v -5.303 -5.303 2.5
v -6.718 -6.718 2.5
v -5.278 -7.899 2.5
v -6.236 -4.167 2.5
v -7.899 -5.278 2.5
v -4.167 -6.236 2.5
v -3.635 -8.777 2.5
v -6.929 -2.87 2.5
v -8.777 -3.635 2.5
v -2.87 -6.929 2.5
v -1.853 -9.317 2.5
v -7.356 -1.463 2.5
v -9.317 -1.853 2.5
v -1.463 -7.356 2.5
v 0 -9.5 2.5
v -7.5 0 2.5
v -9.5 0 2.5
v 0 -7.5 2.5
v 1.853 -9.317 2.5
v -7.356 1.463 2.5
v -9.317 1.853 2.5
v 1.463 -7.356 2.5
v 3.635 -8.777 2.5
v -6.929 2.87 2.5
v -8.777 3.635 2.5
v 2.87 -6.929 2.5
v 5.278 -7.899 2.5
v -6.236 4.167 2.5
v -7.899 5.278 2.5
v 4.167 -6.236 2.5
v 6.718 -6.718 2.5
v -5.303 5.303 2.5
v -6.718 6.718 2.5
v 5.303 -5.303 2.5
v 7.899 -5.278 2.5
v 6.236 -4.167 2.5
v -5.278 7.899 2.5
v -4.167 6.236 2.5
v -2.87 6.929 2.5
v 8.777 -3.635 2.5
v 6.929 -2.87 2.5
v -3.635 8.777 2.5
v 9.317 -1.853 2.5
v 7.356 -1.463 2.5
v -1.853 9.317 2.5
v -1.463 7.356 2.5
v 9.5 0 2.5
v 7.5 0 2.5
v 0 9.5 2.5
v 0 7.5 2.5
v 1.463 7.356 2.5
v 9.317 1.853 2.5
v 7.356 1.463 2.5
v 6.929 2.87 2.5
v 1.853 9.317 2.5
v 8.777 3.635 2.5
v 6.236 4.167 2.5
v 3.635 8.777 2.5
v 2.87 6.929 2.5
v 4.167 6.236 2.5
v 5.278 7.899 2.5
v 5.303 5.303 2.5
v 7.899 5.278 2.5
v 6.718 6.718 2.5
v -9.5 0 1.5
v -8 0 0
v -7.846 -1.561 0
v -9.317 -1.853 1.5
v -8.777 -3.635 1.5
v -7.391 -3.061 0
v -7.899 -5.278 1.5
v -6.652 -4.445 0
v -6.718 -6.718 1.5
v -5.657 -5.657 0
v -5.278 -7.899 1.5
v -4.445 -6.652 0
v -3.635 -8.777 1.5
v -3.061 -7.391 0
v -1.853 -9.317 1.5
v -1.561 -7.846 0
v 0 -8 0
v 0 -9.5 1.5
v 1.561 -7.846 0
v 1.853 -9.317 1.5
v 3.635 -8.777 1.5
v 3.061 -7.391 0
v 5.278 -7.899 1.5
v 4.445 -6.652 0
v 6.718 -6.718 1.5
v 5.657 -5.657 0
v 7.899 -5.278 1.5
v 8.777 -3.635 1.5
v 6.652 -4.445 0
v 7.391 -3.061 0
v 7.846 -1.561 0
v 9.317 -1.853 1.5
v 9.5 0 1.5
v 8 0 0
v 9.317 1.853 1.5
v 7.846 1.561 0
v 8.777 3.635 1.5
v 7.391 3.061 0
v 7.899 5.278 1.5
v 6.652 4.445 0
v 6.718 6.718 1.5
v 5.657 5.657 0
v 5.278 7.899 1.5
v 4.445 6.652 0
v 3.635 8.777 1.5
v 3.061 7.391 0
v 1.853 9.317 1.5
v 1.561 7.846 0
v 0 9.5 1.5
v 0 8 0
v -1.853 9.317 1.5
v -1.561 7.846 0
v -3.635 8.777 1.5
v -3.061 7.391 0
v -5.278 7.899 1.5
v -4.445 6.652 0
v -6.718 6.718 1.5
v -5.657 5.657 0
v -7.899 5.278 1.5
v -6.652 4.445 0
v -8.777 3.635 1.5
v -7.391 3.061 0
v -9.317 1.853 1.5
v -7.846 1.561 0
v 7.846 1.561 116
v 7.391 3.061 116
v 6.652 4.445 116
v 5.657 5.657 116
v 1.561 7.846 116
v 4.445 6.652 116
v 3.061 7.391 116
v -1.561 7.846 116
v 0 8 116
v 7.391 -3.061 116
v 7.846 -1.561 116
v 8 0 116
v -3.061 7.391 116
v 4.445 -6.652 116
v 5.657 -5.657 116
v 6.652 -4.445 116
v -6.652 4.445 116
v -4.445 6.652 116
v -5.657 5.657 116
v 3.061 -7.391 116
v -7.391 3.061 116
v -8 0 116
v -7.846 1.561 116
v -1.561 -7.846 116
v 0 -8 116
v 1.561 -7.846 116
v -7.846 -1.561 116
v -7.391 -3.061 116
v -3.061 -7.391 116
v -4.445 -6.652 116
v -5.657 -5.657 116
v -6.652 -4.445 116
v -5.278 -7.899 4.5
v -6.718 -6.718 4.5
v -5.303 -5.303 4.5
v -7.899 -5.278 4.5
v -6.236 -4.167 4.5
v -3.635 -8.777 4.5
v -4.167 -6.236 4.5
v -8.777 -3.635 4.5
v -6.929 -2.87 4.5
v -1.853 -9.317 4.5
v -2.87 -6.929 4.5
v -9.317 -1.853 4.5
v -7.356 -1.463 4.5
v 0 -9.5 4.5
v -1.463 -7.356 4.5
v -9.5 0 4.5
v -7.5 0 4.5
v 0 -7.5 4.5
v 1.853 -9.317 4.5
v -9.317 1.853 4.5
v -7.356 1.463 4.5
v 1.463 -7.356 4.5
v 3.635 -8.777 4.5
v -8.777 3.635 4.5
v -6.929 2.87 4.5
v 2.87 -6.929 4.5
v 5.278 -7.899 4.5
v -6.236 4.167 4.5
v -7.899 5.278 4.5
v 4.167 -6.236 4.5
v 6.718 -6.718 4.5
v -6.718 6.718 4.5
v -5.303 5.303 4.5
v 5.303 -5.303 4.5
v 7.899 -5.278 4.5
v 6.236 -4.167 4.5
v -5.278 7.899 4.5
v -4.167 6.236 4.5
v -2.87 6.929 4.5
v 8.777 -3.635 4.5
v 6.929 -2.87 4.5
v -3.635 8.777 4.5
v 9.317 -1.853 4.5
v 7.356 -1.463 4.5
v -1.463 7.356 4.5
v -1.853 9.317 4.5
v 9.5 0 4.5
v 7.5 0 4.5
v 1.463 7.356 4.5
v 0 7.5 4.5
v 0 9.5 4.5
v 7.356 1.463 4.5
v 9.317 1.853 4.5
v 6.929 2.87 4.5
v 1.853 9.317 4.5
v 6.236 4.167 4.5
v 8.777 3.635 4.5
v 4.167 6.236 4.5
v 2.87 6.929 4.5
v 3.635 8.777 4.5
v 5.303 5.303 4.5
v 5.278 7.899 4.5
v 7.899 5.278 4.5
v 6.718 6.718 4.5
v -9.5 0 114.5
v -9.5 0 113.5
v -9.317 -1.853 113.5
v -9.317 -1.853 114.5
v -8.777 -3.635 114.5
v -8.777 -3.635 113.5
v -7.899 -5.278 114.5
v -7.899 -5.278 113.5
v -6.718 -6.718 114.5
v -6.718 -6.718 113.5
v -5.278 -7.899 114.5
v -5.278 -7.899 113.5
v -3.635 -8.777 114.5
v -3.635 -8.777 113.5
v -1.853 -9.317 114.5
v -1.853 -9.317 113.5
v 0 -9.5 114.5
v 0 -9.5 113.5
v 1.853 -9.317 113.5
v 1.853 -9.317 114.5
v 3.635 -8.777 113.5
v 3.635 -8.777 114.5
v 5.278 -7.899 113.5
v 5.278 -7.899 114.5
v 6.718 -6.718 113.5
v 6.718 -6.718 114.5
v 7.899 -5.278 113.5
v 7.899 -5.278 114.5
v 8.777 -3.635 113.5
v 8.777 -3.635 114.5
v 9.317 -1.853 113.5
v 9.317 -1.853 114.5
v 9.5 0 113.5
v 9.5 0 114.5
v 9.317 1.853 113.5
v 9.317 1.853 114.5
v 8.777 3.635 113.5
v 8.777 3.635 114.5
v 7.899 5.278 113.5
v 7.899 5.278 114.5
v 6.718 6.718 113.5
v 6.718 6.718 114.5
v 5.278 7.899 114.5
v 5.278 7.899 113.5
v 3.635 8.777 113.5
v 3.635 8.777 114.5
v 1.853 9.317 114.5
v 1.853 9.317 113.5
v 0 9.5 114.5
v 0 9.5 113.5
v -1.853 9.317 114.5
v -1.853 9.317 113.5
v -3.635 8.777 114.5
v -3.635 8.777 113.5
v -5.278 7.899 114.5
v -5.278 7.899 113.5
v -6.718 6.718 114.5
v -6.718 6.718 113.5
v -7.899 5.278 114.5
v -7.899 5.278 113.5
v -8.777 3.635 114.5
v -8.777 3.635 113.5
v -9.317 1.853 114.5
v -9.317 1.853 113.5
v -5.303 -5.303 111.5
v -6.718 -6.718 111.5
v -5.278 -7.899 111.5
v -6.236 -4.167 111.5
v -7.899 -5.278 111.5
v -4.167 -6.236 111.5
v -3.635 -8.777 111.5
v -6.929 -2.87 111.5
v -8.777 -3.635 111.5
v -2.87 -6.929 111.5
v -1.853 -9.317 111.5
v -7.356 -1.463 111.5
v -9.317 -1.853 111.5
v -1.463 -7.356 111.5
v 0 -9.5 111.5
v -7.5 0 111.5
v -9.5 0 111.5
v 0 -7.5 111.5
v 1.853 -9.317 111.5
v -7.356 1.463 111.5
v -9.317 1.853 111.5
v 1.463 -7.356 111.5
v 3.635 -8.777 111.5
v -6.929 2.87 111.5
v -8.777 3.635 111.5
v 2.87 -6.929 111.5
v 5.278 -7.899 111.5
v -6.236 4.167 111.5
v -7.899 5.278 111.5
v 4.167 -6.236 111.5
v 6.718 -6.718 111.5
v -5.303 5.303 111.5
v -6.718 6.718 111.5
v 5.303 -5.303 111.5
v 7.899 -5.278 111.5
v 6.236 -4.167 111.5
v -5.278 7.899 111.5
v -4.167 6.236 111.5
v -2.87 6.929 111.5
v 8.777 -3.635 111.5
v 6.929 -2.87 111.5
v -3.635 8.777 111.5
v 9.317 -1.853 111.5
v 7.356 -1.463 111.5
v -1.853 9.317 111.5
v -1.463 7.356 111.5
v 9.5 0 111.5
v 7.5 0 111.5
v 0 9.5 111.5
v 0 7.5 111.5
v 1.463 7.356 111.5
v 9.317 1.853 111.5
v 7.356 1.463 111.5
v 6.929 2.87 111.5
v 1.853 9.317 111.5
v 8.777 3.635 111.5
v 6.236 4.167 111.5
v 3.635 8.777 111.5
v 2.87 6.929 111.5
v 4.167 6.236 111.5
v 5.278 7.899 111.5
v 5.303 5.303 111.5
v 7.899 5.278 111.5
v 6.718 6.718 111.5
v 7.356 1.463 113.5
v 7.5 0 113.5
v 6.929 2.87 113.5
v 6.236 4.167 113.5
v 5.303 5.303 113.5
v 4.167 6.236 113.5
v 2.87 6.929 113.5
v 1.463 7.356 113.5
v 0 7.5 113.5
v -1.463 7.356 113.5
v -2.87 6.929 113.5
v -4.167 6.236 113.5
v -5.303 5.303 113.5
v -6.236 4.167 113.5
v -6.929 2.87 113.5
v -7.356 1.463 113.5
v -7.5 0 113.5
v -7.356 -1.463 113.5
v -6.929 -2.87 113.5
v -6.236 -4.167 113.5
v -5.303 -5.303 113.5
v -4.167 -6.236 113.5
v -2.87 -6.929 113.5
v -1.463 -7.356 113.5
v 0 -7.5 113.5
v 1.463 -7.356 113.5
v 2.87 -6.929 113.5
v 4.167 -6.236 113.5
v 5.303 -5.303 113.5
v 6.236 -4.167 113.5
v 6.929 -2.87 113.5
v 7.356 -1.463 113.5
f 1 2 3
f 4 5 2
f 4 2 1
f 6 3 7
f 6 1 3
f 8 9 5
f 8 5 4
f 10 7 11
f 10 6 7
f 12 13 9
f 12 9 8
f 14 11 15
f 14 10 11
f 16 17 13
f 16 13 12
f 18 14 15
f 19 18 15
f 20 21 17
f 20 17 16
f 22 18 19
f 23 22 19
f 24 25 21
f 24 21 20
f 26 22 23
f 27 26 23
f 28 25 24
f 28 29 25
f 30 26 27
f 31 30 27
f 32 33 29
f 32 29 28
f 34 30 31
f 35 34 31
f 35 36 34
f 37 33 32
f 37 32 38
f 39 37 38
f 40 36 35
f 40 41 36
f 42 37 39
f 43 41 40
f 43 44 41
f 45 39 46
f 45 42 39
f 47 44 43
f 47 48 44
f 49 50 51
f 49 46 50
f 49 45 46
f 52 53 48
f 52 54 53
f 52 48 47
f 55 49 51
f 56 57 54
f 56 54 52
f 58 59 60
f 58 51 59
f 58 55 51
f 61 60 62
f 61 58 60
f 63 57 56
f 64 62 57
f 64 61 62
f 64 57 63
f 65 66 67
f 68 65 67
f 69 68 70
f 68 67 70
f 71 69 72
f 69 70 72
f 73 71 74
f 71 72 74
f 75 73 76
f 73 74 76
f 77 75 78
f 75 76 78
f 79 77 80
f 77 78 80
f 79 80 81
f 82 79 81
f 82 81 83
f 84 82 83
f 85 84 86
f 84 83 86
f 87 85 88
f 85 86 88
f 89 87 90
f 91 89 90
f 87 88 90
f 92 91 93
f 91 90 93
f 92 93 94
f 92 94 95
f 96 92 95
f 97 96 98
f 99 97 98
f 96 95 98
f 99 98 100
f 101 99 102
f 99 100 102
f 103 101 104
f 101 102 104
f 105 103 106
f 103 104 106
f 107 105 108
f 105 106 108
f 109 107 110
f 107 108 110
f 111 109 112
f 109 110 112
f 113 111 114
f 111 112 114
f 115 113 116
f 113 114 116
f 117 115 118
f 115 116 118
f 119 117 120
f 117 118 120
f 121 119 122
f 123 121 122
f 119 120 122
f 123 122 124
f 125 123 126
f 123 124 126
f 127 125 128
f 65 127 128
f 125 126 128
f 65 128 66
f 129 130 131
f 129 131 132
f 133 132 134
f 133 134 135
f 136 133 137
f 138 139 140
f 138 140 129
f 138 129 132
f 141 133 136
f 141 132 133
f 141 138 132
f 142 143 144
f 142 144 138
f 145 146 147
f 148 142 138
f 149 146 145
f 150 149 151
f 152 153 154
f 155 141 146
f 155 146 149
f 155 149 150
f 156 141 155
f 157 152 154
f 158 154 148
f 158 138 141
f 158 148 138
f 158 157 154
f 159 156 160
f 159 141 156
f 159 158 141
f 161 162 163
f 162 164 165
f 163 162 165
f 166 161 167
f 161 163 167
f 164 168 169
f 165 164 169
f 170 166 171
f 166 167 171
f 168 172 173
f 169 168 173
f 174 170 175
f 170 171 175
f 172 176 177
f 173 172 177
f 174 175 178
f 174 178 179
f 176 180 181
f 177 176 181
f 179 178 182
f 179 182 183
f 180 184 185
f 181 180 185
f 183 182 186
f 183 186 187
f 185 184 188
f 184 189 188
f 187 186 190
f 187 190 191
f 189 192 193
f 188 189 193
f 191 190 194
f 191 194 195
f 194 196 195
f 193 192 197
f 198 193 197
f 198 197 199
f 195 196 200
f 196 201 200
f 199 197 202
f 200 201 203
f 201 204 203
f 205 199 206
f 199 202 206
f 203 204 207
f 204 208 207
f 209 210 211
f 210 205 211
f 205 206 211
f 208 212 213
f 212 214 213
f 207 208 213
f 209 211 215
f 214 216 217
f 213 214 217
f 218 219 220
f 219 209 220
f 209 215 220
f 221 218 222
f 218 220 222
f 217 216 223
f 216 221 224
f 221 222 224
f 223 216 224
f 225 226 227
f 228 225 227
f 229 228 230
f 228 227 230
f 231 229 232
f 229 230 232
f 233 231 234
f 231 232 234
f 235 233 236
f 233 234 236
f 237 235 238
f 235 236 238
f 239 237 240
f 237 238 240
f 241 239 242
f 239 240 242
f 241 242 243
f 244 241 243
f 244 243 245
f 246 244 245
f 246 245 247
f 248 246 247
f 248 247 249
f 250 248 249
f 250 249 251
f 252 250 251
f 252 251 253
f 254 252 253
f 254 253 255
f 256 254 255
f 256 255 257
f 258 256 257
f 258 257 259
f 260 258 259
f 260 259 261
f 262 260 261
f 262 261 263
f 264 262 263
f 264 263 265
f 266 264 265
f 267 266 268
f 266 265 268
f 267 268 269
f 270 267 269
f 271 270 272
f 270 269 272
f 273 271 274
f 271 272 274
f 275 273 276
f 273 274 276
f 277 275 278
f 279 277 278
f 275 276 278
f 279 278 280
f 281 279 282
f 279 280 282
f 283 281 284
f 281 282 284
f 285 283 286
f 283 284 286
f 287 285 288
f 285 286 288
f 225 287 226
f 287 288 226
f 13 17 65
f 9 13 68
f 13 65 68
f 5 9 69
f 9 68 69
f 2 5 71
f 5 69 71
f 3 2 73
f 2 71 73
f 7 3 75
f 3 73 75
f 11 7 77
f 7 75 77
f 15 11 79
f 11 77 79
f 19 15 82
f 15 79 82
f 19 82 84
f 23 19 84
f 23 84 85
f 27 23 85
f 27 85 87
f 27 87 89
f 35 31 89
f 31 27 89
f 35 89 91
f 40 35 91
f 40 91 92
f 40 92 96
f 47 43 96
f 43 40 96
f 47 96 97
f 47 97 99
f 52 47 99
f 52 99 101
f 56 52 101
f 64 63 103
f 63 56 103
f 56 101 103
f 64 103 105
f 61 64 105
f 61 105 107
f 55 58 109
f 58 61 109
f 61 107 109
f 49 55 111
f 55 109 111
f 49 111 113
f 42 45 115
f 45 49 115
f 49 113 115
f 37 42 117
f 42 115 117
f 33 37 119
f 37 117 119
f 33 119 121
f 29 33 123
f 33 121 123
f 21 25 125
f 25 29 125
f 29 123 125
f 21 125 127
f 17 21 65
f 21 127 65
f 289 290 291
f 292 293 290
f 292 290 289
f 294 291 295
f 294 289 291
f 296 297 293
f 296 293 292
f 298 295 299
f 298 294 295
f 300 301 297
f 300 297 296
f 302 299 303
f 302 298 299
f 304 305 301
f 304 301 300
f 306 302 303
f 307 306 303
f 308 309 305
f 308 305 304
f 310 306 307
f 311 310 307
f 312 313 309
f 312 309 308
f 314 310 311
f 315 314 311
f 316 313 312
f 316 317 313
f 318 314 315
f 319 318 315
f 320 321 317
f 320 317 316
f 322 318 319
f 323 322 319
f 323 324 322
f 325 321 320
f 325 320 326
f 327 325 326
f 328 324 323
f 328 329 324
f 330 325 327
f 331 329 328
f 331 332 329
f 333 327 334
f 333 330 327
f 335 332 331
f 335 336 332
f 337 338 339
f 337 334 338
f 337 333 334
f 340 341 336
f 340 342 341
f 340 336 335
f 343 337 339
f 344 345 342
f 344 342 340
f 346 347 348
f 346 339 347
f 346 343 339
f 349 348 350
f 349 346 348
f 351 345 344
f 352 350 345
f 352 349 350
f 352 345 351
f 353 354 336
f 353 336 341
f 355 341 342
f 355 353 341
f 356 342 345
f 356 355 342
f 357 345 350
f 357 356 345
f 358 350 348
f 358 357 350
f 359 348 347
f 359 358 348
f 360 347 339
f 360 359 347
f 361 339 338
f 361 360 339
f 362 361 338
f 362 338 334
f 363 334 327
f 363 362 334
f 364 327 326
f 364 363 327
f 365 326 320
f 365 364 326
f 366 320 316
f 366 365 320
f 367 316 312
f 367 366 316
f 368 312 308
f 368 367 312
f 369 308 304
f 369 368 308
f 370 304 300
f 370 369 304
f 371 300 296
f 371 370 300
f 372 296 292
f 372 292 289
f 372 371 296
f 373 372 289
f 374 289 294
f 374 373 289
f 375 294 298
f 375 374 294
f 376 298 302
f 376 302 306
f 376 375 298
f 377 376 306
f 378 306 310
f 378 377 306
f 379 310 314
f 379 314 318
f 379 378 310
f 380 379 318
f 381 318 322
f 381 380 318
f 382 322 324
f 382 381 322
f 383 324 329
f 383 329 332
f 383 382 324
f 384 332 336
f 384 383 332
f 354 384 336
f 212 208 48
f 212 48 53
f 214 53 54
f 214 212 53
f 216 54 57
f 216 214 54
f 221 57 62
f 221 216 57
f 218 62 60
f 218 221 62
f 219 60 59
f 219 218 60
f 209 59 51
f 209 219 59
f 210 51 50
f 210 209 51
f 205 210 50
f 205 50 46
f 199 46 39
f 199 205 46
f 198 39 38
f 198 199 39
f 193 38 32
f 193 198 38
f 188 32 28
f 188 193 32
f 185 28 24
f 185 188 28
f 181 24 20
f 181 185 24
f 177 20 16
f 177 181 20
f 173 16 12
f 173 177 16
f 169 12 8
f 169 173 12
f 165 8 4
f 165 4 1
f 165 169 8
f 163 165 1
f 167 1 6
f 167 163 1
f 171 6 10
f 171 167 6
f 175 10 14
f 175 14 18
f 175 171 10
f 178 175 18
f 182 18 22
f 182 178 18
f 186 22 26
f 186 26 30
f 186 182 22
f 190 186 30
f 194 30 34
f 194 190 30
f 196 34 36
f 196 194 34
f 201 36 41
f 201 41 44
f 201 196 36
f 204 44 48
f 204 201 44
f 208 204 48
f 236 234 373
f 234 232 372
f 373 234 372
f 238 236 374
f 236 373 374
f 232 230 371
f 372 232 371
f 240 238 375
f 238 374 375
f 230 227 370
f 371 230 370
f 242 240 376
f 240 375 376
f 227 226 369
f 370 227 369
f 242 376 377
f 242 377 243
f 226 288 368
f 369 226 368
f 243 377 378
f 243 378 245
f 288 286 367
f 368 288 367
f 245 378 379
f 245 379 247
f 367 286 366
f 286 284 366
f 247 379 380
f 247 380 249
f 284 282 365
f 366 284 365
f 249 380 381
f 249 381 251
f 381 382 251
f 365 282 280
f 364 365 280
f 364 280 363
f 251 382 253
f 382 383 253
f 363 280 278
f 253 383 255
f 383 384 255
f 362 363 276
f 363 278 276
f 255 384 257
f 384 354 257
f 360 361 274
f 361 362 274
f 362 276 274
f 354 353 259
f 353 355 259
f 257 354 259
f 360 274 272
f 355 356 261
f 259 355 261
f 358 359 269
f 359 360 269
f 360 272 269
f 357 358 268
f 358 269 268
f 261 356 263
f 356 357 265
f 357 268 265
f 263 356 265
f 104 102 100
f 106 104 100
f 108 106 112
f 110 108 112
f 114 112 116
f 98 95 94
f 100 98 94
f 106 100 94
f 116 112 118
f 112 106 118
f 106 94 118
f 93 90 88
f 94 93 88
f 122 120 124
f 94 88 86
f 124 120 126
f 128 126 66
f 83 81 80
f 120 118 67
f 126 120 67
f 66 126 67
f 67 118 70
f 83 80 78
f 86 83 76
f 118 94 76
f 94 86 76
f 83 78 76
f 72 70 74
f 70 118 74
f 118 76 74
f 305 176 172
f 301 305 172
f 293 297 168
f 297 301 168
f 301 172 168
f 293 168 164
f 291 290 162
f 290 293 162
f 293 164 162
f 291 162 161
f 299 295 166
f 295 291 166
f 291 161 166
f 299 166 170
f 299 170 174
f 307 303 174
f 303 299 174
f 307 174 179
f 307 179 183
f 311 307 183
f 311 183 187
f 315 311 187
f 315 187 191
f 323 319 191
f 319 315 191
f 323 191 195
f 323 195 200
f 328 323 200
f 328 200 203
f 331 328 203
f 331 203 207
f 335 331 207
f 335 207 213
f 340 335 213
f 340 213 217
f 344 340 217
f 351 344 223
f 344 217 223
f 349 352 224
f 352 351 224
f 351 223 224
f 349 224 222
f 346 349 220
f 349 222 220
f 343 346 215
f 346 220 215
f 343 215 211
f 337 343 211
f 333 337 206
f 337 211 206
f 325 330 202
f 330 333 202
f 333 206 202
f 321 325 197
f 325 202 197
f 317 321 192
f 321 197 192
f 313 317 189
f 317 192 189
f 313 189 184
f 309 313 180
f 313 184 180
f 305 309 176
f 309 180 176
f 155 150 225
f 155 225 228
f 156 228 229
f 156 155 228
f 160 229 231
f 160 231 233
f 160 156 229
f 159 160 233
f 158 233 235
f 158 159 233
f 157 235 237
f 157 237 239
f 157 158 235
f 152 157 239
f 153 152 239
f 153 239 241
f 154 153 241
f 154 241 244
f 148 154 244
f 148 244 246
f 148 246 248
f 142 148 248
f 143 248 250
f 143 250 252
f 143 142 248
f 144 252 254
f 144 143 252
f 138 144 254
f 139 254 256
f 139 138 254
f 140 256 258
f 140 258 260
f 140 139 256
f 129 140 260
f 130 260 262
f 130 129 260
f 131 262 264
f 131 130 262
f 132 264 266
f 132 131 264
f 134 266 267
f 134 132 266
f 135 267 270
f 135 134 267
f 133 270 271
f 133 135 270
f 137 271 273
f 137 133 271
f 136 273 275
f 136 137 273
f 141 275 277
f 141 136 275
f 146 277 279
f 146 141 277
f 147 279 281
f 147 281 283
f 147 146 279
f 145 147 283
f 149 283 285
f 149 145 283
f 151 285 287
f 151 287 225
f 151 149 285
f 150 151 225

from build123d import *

# Parameters (mm, degrees)
ESQUISSE1_R                = 9.5
BASE_EXTRUSION_DEPTH       = 116
CHANFREIN1_SIZE            = 1.5
ESQUISSE2_R                = 12
ESQUISSE2_R_2              = 7.5
ENL_V_MAT_EXTRU_1_DEPTH    = 2
R_P_TITION_LIN_AIRE1_COUNT = 2
R_P_TITION_LIN_AIRE1_PITCH = 109


with BuildPart() as part:
    # Esquisse1 → Base-Extrusion (new body)
    with BuildSketch(Plane.XY):
        with Locations(Location((0, 0, 0), (0, 0, 180))):
            Circle(ESQUISSE1_R)
    extrude(amount=BASE_EXTRUSION_DEPTH)

    # Chanfrein1
    chanfrein1_edges = [part.edges().sort_by_distance(p)[0] for p in [
        (9.5, 0, 0),
        (9.5, 0, 116),
    ]]
    chamfer(chanfrein1_edges, length=CHANFREIN1_SIZE)

    # Esquisse2 → Enlèv. mat.-Extru.1 (cut)
    with BuildSketch(Plane.XY.offset(113.5)):
        Circle(ESQUISSE2_R)
        Circle(ESQUISSE2_R_2, mode=Mode.SUBTRACT)
    enl_v_mat_extru_1 = extrude(amount=-ENL_V_MAT_EXTRU_1_DEPTH, mode=Mode.SUBTRACT)

    # Répétition linéaire1: Enlèv. mat.-Extru.1 ×2
    with Locations(*[(0, 0, -i * R_P_TITION_LIN_AIRE1_PITCH) for i in range(1, R_P_TITION_LIN_AIRE1_COUNT)]):
        add(enl_v_mat_extru_1, mode=Mode.SUBTRACT)


solid = part.part
